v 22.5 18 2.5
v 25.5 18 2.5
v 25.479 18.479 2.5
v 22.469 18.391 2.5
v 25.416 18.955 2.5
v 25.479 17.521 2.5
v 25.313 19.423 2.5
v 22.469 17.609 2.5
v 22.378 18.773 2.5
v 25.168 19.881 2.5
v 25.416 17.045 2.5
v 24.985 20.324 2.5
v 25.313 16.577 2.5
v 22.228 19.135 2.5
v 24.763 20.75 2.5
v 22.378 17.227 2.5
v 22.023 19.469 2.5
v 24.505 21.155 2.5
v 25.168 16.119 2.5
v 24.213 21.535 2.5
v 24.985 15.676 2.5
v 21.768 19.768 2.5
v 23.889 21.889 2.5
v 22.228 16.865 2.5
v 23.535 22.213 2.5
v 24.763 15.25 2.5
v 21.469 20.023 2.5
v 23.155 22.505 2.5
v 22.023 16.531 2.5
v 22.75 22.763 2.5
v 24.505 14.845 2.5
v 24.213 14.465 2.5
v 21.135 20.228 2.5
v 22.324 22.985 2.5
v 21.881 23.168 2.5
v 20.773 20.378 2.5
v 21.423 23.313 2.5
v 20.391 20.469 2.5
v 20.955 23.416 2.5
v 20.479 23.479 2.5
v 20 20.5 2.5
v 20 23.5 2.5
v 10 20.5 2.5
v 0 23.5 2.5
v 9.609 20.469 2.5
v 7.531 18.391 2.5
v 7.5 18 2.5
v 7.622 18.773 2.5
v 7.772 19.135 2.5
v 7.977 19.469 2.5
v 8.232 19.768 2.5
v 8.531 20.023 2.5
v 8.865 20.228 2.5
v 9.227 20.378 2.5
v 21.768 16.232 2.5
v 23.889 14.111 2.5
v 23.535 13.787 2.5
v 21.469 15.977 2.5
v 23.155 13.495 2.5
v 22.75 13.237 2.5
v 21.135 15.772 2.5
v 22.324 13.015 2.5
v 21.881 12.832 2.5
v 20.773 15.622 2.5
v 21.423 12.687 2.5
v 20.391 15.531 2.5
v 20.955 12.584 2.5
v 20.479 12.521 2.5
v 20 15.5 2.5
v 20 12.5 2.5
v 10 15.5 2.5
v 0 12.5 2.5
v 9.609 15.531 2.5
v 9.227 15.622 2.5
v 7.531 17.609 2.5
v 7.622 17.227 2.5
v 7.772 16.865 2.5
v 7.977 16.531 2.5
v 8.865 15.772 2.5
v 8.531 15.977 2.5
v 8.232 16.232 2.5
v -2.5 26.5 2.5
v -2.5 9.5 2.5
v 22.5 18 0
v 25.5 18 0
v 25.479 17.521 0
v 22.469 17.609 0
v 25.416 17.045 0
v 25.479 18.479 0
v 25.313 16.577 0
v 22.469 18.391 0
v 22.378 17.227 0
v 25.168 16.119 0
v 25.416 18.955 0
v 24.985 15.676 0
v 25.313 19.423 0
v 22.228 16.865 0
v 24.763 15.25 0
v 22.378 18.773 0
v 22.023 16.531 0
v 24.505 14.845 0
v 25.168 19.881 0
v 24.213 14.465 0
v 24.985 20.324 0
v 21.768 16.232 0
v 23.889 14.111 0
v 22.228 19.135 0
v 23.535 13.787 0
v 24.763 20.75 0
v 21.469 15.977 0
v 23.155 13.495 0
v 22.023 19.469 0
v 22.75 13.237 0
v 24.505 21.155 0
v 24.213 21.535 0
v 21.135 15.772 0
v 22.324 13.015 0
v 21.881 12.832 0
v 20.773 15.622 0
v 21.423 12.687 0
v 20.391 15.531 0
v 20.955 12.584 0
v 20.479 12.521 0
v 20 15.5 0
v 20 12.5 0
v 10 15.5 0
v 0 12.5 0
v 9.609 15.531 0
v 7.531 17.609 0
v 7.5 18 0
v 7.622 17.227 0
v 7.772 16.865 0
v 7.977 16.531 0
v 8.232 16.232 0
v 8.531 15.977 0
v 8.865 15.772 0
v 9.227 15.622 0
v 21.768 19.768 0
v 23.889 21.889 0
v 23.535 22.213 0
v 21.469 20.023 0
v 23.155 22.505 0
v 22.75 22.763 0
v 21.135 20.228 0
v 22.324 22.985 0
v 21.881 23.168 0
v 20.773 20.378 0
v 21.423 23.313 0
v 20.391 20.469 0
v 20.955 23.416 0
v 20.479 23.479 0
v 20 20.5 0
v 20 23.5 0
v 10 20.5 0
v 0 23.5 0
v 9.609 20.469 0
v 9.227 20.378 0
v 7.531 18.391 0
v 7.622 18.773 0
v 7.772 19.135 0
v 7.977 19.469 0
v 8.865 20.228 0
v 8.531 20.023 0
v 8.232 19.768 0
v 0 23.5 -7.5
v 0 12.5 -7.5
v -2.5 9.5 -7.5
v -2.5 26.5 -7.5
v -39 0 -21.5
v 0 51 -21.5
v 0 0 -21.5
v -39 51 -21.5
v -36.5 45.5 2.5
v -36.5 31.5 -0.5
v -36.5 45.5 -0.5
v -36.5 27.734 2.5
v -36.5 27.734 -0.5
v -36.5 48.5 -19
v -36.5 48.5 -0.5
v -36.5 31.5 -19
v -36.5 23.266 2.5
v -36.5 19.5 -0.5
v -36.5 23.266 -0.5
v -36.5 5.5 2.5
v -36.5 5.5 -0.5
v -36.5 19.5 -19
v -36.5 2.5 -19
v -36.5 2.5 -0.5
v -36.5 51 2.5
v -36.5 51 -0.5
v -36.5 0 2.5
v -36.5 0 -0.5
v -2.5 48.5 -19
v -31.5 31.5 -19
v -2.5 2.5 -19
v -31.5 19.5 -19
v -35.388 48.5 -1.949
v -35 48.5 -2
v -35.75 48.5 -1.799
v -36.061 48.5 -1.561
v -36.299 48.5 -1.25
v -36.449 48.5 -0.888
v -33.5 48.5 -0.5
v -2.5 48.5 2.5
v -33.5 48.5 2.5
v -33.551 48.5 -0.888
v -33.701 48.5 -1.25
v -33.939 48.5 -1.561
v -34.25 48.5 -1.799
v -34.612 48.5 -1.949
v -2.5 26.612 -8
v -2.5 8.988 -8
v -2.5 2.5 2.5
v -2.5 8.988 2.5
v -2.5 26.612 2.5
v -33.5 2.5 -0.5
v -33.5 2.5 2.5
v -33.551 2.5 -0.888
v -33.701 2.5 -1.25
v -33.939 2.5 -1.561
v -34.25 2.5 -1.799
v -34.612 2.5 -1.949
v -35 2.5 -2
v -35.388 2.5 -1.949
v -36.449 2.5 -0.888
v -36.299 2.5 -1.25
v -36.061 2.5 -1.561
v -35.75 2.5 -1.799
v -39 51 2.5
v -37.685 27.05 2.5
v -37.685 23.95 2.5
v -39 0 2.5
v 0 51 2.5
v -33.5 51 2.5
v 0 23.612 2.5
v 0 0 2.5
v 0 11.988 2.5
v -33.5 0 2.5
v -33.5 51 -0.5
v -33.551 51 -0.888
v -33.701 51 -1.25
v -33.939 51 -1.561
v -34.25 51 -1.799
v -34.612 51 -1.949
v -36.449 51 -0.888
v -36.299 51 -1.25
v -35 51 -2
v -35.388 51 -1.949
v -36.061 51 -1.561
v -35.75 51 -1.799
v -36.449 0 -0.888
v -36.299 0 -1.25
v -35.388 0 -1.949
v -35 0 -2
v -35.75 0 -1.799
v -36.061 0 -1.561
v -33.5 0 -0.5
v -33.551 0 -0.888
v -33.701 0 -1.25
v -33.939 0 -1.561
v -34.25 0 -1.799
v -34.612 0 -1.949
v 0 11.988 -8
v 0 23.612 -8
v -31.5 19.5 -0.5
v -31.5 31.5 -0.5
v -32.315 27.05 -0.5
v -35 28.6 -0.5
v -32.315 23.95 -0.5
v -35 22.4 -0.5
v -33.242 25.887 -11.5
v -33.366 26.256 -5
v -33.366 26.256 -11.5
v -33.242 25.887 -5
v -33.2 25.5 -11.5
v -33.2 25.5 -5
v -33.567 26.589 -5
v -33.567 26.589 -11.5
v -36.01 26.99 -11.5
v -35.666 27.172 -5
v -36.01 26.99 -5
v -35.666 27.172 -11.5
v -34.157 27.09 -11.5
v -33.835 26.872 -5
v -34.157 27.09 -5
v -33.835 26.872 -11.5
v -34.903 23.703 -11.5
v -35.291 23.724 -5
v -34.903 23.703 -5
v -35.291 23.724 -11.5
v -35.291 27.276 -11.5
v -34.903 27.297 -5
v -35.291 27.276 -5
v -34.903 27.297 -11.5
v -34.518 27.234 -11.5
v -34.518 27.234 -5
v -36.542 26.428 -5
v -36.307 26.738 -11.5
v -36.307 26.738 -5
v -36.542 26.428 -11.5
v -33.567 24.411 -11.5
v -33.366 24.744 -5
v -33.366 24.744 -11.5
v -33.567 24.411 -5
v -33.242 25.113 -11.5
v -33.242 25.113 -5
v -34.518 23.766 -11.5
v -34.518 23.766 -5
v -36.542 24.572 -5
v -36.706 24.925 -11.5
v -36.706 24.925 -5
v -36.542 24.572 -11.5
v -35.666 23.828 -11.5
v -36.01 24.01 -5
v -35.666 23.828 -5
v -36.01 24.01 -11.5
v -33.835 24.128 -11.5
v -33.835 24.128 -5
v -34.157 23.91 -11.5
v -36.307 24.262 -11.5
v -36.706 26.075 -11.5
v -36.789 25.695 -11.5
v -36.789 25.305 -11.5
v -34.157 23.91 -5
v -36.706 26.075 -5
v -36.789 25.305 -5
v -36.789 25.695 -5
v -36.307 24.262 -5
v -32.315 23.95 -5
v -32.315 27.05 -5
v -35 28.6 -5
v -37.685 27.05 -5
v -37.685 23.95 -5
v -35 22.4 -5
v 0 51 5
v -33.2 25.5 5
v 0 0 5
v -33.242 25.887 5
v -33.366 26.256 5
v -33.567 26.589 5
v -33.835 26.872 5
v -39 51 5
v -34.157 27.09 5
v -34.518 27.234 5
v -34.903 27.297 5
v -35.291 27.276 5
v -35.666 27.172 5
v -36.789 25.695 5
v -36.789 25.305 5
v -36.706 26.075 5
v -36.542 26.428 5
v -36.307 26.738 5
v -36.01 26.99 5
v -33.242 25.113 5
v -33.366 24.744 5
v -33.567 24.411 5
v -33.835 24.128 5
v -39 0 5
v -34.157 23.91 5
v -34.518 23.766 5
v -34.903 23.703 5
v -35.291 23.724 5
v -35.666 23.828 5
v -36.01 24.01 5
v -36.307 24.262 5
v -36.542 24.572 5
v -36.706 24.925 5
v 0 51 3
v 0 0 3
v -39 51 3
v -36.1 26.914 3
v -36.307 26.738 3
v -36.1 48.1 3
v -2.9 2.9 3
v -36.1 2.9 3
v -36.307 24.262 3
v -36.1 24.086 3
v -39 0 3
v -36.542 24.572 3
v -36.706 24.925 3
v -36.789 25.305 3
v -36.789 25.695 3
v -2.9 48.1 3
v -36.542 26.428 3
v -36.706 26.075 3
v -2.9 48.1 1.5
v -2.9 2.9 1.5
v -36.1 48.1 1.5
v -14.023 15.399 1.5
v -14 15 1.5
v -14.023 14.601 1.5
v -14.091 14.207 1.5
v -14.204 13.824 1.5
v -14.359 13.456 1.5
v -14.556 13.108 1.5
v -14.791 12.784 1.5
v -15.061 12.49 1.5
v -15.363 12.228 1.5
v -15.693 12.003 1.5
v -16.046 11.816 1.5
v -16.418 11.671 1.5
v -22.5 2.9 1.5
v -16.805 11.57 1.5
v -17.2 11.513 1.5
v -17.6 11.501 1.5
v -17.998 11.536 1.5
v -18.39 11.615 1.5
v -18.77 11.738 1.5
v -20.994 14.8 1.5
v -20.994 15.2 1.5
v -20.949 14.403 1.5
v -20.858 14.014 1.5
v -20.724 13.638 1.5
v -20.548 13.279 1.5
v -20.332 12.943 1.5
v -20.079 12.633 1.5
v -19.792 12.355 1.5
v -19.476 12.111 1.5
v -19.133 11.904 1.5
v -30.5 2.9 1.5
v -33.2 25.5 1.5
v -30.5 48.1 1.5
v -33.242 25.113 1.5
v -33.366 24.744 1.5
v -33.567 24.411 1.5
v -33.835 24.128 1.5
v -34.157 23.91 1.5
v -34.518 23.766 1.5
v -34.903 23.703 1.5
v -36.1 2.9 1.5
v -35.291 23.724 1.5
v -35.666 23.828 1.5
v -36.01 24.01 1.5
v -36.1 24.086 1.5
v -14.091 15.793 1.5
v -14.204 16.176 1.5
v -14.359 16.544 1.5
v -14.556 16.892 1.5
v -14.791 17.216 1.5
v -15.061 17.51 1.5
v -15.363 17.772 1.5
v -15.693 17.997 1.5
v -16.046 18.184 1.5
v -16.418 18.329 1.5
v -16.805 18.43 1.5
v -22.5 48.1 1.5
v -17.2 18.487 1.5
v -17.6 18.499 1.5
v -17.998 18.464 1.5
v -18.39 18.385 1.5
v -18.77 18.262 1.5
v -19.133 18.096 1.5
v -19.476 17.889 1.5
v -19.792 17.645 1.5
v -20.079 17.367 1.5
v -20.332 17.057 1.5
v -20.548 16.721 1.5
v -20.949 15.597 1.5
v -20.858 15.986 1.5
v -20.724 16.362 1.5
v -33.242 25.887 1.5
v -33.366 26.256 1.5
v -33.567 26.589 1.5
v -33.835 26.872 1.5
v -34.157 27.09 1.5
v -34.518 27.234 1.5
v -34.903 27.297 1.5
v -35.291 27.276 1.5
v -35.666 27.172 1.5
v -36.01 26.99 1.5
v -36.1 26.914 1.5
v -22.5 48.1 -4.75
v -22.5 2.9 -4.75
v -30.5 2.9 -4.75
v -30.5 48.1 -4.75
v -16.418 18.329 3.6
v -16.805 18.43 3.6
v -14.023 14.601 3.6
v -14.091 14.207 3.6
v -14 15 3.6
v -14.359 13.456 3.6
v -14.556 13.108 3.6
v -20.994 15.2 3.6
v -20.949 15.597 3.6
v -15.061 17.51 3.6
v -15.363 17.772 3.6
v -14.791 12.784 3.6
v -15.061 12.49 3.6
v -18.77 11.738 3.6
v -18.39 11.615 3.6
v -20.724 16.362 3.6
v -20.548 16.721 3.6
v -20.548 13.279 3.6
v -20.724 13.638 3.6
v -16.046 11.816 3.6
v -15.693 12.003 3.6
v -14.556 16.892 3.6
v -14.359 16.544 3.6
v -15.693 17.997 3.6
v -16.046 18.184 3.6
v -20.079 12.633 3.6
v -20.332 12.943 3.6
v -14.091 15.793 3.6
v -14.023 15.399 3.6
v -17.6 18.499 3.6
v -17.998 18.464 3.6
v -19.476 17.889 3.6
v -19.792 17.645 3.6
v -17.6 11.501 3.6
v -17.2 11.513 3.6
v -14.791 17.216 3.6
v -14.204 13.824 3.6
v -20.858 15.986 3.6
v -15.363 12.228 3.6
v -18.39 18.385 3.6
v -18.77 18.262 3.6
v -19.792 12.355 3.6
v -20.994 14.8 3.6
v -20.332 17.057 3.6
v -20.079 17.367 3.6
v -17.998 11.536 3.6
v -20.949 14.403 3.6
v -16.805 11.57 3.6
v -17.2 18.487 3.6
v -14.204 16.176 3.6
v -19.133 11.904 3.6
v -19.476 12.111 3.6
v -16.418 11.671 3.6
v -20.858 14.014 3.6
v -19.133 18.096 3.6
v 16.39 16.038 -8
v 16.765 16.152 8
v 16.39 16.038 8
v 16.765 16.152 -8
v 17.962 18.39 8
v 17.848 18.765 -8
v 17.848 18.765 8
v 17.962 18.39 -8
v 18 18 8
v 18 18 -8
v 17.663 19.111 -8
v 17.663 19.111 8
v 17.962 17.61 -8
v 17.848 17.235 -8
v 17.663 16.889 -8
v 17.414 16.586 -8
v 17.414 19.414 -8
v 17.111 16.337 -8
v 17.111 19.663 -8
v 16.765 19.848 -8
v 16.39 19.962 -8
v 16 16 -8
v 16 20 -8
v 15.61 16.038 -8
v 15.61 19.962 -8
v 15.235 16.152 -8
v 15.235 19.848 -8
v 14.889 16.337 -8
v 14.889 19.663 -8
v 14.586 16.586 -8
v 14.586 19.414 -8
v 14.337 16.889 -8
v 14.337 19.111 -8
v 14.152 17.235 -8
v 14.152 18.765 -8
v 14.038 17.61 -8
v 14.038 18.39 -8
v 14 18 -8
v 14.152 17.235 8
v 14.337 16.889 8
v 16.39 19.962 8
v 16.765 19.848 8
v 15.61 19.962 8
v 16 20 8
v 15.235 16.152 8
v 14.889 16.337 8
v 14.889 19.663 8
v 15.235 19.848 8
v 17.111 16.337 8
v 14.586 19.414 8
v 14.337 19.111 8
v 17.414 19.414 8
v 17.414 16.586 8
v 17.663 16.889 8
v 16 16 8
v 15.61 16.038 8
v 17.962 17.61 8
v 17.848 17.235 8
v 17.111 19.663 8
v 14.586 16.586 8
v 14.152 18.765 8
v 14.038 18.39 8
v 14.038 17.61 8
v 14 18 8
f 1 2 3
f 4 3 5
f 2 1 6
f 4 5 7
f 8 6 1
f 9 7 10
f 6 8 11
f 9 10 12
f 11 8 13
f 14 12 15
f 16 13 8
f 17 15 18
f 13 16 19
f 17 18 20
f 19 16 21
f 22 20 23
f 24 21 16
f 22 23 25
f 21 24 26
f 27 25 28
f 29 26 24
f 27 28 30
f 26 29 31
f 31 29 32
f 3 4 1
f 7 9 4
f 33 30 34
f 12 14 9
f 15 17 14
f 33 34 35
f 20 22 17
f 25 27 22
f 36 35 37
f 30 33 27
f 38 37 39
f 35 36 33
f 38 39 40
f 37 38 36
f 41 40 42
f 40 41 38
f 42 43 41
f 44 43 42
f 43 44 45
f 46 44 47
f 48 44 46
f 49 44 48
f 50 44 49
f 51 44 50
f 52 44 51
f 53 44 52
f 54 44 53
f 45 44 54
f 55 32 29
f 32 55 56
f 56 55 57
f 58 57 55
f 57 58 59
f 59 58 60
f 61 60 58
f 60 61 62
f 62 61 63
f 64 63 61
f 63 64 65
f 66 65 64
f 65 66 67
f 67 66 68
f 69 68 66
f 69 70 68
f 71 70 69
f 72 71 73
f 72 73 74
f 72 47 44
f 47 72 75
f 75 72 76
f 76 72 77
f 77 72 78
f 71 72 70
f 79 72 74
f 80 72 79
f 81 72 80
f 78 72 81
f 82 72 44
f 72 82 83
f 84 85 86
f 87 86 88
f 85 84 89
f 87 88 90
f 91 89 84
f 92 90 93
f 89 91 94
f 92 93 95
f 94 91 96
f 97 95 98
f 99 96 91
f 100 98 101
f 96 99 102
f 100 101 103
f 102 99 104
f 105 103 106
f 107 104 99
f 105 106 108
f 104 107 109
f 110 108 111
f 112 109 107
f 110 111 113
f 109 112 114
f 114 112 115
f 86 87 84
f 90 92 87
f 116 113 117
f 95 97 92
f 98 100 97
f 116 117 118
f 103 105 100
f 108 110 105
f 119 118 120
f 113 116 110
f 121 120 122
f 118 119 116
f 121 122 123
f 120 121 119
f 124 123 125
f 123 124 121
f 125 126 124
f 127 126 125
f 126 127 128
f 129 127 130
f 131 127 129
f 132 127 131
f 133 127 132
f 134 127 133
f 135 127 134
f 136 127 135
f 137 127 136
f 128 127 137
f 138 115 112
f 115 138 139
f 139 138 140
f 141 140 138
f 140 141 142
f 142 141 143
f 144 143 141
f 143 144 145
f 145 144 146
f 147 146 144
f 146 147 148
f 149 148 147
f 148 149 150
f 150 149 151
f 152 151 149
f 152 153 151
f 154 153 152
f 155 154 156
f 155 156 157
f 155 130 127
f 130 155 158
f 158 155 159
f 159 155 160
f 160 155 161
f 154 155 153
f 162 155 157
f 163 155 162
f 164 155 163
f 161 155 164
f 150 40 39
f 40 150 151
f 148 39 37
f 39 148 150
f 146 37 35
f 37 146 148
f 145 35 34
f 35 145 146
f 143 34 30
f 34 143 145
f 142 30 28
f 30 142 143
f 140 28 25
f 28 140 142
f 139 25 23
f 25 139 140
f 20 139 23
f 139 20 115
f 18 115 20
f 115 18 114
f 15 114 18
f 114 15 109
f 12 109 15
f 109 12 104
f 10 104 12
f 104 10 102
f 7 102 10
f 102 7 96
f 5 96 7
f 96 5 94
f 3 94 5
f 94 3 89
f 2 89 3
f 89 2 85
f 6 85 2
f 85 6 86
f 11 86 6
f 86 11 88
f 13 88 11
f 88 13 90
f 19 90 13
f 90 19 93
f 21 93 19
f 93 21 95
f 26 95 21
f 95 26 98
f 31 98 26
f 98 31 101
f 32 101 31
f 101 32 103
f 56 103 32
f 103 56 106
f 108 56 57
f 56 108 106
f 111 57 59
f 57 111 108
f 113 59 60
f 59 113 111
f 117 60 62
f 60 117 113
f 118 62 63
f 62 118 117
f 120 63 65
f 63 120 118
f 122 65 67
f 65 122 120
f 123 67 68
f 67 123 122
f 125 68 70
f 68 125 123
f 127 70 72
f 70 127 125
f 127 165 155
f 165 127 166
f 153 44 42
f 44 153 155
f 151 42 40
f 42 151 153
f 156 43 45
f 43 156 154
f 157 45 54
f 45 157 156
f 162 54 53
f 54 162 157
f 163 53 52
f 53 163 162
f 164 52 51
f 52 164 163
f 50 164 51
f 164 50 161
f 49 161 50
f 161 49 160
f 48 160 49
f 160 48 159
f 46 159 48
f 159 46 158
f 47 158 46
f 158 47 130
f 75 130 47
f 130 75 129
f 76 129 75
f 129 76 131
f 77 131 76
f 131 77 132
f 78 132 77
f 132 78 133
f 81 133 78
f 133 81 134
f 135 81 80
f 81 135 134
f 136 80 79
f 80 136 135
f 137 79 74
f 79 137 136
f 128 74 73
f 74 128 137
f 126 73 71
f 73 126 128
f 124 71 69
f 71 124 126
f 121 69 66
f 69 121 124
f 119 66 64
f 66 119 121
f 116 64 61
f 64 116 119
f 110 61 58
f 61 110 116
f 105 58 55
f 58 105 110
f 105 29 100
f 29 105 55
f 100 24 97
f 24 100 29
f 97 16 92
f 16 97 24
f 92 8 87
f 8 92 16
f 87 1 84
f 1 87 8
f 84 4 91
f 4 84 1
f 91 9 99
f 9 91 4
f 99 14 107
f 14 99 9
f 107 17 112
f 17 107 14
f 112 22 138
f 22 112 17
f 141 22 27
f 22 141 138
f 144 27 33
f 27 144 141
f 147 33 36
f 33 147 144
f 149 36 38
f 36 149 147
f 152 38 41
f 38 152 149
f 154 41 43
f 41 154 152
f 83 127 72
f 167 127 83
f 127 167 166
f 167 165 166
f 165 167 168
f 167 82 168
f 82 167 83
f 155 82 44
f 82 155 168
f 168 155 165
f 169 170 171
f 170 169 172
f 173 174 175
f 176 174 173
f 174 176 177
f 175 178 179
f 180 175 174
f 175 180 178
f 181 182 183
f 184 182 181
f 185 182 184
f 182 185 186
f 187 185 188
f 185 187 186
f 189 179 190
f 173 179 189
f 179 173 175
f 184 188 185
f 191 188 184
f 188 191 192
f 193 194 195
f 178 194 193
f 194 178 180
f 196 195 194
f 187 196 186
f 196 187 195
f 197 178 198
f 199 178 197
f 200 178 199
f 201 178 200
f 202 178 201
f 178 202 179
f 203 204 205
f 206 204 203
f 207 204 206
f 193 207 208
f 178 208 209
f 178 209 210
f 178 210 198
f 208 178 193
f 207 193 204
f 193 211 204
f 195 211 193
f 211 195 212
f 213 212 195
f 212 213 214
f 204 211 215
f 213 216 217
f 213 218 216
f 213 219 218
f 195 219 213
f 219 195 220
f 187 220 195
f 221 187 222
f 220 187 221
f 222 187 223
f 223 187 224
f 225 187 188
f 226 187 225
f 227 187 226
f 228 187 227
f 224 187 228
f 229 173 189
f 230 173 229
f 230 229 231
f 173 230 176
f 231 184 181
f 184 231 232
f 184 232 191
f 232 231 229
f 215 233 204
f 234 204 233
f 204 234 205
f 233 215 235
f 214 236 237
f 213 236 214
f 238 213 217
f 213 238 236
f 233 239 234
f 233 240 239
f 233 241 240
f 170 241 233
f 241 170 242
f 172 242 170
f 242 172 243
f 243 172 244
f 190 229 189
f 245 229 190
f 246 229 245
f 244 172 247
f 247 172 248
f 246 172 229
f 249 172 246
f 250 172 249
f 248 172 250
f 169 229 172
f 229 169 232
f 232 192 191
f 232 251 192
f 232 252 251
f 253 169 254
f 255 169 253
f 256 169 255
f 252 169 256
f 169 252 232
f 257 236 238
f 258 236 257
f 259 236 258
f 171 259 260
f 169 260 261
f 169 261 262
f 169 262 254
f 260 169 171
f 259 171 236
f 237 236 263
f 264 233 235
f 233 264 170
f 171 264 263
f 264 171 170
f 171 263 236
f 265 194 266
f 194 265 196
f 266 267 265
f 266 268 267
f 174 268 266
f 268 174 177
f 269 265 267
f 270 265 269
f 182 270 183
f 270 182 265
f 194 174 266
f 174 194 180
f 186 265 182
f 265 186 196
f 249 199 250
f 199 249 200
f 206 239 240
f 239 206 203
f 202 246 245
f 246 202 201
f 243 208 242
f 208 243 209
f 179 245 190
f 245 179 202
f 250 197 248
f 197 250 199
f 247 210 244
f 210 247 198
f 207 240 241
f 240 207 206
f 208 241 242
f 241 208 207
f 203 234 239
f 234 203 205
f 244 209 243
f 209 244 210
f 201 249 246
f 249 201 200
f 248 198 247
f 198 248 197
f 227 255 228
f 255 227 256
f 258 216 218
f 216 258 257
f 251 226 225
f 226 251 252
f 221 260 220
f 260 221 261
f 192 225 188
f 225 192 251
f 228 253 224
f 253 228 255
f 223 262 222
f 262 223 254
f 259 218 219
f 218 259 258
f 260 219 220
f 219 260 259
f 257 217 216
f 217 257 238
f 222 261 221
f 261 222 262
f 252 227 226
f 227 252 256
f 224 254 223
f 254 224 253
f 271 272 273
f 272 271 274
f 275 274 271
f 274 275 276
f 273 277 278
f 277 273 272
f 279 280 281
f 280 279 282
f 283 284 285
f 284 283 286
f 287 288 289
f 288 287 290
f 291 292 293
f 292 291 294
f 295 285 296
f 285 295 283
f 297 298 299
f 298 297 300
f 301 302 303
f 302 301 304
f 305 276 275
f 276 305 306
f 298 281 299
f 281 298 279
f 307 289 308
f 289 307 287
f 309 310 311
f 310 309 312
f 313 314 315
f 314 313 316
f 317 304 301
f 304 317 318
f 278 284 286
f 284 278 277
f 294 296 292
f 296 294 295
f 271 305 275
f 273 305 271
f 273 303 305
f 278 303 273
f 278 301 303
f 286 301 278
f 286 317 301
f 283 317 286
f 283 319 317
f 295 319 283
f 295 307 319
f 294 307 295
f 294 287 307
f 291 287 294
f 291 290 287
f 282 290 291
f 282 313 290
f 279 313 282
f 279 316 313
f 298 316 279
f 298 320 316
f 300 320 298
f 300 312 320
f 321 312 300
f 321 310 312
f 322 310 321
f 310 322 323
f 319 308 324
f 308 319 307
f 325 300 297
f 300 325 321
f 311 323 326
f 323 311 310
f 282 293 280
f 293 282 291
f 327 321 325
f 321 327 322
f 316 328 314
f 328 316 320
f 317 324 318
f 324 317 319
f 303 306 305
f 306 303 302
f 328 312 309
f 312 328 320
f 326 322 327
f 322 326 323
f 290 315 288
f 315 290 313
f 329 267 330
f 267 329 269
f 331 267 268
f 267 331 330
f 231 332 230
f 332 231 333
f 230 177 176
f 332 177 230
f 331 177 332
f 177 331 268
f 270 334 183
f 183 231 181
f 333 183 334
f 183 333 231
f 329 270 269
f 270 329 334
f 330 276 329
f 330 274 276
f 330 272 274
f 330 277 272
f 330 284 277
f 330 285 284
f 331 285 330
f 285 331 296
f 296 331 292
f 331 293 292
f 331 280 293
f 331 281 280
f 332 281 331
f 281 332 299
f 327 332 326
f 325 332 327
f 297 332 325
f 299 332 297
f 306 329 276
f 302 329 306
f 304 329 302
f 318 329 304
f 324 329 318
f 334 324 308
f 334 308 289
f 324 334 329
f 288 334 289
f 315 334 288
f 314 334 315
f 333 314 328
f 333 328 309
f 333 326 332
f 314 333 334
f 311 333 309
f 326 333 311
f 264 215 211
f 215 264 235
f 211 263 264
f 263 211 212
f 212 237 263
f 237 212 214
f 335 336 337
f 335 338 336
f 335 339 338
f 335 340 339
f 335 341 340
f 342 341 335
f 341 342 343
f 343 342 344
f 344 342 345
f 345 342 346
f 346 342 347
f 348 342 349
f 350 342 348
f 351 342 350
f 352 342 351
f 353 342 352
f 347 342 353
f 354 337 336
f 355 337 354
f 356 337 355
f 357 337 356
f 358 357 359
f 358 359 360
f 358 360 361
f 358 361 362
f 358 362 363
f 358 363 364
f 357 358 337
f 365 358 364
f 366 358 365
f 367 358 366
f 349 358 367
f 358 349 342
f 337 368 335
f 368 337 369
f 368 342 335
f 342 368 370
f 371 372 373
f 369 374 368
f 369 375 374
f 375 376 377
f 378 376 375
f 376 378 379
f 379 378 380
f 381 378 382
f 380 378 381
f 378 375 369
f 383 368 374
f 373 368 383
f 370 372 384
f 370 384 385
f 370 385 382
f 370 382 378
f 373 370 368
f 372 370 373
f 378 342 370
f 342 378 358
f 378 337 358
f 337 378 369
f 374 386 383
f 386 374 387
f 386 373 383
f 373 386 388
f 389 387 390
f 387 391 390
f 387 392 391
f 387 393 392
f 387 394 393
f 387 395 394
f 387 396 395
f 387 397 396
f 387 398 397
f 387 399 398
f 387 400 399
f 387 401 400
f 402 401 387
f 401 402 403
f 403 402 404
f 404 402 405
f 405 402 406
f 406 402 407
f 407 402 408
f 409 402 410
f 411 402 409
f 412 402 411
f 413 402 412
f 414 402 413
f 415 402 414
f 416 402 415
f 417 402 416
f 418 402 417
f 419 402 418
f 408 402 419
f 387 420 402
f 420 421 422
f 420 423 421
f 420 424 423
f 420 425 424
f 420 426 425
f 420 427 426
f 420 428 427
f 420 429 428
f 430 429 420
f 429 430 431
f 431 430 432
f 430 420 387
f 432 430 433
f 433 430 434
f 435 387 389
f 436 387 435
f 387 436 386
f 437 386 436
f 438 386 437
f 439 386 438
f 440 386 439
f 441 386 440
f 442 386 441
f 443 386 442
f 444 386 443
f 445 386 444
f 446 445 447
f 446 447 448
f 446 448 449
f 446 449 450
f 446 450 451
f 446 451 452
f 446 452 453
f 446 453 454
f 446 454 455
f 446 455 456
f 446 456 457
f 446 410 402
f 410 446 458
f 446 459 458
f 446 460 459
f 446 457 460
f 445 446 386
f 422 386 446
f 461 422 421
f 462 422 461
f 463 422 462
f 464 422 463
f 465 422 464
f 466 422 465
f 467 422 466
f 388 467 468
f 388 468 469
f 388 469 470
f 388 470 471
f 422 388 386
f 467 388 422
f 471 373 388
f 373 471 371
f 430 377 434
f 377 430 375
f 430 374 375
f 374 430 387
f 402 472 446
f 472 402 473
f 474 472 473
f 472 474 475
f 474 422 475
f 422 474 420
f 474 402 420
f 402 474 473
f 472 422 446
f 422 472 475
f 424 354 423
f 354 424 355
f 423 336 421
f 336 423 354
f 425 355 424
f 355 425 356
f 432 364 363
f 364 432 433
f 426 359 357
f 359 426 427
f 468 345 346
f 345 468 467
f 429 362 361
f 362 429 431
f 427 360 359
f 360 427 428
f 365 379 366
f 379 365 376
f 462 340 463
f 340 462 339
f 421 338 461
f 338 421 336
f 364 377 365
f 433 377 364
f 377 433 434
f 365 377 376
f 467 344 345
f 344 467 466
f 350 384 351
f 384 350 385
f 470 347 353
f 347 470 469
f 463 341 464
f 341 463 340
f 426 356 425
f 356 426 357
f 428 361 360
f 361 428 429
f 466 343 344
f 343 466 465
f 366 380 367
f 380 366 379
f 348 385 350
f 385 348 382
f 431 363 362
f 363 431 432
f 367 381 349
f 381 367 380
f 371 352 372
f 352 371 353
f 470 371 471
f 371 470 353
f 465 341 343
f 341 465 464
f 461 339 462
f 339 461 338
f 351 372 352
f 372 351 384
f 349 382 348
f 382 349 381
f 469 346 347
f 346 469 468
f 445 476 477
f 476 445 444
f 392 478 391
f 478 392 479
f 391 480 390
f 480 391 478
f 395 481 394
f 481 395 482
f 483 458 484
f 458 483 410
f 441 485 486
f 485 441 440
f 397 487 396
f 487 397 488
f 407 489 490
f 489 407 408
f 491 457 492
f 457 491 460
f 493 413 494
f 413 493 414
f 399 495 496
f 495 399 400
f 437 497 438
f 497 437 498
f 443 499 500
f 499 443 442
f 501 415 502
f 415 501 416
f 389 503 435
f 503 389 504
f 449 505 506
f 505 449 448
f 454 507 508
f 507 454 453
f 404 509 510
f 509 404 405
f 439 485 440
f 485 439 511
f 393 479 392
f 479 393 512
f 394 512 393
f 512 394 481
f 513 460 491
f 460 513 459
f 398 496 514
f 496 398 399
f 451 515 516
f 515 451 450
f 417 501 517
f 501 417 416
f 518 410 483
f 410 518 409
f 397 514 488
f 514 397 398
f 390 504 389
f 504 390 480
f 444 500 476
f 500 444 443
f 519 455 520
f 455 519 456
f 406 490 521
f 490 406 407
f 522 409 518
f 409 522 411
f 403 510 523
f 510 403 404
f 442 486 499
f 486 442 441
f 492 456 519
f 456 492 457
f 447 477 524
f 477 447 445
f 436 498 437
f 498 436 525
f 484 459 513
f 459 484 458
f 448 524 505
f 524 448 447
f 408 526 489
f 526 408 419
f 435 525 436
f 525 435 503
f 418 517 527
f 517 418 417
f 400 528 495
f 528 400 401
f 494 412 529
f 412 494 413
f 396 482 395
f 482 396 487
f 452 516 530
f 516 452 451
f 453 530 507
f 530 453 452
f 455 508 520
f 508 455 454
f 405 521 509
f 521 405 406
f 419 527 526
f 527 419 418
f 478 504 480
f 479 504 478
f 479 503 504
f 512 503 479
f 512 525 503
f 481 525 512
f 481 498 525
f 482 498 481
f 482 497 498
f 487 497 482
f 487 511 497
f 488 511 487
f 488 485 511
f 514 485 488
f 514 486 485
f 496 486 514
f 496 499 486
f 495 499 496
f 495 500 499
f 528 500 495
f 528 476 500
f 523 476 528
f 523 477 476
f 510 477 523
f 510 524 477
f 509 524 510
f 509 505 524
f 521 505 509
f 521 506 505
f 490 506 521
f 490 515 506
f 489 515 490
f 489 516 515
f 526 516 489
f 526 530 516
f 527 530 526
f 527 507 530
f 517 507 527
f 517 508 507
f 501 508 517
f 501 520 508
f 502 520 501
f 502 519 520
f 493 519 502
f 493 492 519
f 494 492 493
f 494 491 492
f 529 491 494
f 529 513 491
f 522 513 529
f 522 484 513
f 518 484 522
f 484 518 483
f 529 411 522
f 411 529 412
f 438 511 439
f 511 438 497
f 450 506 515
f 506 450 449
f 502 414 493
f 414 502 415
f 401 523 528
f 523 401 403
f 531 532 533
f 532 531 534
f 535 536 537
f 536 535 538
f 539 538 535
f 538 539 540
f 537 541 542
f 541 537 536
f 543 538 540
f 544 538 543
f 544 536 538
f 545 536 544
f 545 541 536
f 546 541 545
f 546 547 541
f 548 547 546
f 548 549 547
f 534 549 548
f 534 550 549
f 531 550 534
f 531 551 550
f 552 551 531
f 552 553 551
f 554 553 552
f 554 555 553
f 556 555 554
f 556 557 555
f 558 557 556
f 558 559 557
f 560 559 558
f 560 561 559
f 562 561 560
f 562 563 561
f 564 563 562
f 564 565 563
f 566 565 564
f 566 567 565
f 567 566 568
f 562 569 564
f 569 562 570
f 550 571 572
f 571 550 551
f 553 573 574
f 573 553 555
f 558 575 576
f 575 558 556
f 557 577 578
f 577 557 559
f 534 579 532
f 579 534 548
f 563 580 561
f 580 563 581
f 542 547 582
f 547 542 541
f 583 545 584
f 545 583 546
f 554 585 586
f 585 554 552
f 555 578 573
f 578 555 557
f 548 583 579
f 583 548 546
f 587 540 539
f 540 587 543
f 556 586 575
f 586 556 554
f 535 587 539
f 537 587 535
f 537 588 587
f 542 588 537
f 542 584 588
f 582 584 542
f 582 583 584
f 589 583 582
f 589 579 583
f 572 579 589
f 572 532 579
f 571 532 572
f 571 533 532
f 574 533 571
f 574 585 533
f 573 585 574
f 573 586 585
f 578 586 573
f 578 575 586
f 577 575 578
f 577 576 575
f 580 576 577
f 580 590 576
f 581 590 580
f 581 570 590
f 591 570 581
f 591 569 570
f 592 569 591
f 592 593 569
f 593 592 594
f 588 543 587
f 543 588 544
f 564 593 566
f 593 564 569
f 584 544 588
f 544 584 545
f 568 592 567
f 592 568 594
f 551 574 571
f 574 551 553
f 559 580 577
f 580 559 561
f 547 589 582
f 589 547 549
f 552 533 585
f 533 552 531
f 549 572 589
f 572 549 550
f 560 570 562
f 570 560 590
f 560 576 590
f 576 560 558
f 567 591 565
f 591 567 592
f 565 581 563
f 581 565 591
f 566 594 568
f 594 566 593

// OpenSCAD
//$fn=60;
$fa=5;
$fs=.4;

translate([0,18,2.5]) rotate([180,0,0]) mount1();
translate([-19.5,25.5,-21.5]) box3();
translate([-19.5,25.5,5]) rotate([180,0,0]) cover();

translate([16,18,-8]) cylinder(d=4,h=16);

module cover(){
    difference(){
        union(){
            linear_extrude(height=2) offset(delta=2.5) box1();
            linear_extrude(height=3.5) offset(delta=-0.4) box1();
            translate([-34/2+10,0,5.25]) cube([8,46-0.8,9],center=true);
        }
        translate([-15.5,0,0]) cylinder(h=8,d=3.6,center=true);
        //translate([-15.5,0,2]) cylinder(h=2,d=8);
        translate([34/2-15,46/2-12.5,1.4]) cylinder(h=4,d=7);
        //translate([34/2-4,46/2-5,1.4]) cylinder(h=4,d=5);
    }
}


module box3(){
    difference(){
        box2();
        translate([19.5,-7.7,13.5]) lock2();
        translate([-15.5,0,22.5]) {
            translate([0,23,0]) cable_hole();
            translate([0,-23,0]) cable_hole();
        }
        translate([-15.5,0,24]){
            cylinder(h=28,d=3.6,center=true);
            rotate([0,0,90]) cylinder(h=15,d=6.2,center=true,$fn=6);
        }
    }

}

module cable_hole(){
    translate([0,0,0.5]) rotate([90,0,0]) hull(){
        cube([3,3,6],center=true);
        translate([0,-2,0]) cylinder(h=6,d=3,center=true);
    }
}

module box2(){
    linear_extrude(height=2.5) box1();
    linear_extrude(height=24){
        difference() {
            offset(delta=2.5) box1();
            box1();
        }
    }
    translate([-14.5,0,10.5]) cube([5,12,21],center=true);
}


module box1(){
    square([34,46],center=true);
}

module mount1(){
    linear_extrude(height=2.5) difference(){
        hull(){
            translate([5.5,0,0]) square(11,center=true);
            translate([20,0,0]) circle(d=11);
        }
        hull(){
            translate([10,0,0]) circle(d=5);
            translate([20,0,0]) circle(d=5);
        }
    }
    lock1();
}

module lock2(){
    linear_extrude(height=10.5) offset(delta=0.2) lock_shape();
}

module lock1(){
    linear_extrude(height=10) lock_shape();
}

module lock_shape(){
    polygon([[0,5.5],[0,-5.5],[-2.5,-8.5],[-2.5,8.5]]);
}
